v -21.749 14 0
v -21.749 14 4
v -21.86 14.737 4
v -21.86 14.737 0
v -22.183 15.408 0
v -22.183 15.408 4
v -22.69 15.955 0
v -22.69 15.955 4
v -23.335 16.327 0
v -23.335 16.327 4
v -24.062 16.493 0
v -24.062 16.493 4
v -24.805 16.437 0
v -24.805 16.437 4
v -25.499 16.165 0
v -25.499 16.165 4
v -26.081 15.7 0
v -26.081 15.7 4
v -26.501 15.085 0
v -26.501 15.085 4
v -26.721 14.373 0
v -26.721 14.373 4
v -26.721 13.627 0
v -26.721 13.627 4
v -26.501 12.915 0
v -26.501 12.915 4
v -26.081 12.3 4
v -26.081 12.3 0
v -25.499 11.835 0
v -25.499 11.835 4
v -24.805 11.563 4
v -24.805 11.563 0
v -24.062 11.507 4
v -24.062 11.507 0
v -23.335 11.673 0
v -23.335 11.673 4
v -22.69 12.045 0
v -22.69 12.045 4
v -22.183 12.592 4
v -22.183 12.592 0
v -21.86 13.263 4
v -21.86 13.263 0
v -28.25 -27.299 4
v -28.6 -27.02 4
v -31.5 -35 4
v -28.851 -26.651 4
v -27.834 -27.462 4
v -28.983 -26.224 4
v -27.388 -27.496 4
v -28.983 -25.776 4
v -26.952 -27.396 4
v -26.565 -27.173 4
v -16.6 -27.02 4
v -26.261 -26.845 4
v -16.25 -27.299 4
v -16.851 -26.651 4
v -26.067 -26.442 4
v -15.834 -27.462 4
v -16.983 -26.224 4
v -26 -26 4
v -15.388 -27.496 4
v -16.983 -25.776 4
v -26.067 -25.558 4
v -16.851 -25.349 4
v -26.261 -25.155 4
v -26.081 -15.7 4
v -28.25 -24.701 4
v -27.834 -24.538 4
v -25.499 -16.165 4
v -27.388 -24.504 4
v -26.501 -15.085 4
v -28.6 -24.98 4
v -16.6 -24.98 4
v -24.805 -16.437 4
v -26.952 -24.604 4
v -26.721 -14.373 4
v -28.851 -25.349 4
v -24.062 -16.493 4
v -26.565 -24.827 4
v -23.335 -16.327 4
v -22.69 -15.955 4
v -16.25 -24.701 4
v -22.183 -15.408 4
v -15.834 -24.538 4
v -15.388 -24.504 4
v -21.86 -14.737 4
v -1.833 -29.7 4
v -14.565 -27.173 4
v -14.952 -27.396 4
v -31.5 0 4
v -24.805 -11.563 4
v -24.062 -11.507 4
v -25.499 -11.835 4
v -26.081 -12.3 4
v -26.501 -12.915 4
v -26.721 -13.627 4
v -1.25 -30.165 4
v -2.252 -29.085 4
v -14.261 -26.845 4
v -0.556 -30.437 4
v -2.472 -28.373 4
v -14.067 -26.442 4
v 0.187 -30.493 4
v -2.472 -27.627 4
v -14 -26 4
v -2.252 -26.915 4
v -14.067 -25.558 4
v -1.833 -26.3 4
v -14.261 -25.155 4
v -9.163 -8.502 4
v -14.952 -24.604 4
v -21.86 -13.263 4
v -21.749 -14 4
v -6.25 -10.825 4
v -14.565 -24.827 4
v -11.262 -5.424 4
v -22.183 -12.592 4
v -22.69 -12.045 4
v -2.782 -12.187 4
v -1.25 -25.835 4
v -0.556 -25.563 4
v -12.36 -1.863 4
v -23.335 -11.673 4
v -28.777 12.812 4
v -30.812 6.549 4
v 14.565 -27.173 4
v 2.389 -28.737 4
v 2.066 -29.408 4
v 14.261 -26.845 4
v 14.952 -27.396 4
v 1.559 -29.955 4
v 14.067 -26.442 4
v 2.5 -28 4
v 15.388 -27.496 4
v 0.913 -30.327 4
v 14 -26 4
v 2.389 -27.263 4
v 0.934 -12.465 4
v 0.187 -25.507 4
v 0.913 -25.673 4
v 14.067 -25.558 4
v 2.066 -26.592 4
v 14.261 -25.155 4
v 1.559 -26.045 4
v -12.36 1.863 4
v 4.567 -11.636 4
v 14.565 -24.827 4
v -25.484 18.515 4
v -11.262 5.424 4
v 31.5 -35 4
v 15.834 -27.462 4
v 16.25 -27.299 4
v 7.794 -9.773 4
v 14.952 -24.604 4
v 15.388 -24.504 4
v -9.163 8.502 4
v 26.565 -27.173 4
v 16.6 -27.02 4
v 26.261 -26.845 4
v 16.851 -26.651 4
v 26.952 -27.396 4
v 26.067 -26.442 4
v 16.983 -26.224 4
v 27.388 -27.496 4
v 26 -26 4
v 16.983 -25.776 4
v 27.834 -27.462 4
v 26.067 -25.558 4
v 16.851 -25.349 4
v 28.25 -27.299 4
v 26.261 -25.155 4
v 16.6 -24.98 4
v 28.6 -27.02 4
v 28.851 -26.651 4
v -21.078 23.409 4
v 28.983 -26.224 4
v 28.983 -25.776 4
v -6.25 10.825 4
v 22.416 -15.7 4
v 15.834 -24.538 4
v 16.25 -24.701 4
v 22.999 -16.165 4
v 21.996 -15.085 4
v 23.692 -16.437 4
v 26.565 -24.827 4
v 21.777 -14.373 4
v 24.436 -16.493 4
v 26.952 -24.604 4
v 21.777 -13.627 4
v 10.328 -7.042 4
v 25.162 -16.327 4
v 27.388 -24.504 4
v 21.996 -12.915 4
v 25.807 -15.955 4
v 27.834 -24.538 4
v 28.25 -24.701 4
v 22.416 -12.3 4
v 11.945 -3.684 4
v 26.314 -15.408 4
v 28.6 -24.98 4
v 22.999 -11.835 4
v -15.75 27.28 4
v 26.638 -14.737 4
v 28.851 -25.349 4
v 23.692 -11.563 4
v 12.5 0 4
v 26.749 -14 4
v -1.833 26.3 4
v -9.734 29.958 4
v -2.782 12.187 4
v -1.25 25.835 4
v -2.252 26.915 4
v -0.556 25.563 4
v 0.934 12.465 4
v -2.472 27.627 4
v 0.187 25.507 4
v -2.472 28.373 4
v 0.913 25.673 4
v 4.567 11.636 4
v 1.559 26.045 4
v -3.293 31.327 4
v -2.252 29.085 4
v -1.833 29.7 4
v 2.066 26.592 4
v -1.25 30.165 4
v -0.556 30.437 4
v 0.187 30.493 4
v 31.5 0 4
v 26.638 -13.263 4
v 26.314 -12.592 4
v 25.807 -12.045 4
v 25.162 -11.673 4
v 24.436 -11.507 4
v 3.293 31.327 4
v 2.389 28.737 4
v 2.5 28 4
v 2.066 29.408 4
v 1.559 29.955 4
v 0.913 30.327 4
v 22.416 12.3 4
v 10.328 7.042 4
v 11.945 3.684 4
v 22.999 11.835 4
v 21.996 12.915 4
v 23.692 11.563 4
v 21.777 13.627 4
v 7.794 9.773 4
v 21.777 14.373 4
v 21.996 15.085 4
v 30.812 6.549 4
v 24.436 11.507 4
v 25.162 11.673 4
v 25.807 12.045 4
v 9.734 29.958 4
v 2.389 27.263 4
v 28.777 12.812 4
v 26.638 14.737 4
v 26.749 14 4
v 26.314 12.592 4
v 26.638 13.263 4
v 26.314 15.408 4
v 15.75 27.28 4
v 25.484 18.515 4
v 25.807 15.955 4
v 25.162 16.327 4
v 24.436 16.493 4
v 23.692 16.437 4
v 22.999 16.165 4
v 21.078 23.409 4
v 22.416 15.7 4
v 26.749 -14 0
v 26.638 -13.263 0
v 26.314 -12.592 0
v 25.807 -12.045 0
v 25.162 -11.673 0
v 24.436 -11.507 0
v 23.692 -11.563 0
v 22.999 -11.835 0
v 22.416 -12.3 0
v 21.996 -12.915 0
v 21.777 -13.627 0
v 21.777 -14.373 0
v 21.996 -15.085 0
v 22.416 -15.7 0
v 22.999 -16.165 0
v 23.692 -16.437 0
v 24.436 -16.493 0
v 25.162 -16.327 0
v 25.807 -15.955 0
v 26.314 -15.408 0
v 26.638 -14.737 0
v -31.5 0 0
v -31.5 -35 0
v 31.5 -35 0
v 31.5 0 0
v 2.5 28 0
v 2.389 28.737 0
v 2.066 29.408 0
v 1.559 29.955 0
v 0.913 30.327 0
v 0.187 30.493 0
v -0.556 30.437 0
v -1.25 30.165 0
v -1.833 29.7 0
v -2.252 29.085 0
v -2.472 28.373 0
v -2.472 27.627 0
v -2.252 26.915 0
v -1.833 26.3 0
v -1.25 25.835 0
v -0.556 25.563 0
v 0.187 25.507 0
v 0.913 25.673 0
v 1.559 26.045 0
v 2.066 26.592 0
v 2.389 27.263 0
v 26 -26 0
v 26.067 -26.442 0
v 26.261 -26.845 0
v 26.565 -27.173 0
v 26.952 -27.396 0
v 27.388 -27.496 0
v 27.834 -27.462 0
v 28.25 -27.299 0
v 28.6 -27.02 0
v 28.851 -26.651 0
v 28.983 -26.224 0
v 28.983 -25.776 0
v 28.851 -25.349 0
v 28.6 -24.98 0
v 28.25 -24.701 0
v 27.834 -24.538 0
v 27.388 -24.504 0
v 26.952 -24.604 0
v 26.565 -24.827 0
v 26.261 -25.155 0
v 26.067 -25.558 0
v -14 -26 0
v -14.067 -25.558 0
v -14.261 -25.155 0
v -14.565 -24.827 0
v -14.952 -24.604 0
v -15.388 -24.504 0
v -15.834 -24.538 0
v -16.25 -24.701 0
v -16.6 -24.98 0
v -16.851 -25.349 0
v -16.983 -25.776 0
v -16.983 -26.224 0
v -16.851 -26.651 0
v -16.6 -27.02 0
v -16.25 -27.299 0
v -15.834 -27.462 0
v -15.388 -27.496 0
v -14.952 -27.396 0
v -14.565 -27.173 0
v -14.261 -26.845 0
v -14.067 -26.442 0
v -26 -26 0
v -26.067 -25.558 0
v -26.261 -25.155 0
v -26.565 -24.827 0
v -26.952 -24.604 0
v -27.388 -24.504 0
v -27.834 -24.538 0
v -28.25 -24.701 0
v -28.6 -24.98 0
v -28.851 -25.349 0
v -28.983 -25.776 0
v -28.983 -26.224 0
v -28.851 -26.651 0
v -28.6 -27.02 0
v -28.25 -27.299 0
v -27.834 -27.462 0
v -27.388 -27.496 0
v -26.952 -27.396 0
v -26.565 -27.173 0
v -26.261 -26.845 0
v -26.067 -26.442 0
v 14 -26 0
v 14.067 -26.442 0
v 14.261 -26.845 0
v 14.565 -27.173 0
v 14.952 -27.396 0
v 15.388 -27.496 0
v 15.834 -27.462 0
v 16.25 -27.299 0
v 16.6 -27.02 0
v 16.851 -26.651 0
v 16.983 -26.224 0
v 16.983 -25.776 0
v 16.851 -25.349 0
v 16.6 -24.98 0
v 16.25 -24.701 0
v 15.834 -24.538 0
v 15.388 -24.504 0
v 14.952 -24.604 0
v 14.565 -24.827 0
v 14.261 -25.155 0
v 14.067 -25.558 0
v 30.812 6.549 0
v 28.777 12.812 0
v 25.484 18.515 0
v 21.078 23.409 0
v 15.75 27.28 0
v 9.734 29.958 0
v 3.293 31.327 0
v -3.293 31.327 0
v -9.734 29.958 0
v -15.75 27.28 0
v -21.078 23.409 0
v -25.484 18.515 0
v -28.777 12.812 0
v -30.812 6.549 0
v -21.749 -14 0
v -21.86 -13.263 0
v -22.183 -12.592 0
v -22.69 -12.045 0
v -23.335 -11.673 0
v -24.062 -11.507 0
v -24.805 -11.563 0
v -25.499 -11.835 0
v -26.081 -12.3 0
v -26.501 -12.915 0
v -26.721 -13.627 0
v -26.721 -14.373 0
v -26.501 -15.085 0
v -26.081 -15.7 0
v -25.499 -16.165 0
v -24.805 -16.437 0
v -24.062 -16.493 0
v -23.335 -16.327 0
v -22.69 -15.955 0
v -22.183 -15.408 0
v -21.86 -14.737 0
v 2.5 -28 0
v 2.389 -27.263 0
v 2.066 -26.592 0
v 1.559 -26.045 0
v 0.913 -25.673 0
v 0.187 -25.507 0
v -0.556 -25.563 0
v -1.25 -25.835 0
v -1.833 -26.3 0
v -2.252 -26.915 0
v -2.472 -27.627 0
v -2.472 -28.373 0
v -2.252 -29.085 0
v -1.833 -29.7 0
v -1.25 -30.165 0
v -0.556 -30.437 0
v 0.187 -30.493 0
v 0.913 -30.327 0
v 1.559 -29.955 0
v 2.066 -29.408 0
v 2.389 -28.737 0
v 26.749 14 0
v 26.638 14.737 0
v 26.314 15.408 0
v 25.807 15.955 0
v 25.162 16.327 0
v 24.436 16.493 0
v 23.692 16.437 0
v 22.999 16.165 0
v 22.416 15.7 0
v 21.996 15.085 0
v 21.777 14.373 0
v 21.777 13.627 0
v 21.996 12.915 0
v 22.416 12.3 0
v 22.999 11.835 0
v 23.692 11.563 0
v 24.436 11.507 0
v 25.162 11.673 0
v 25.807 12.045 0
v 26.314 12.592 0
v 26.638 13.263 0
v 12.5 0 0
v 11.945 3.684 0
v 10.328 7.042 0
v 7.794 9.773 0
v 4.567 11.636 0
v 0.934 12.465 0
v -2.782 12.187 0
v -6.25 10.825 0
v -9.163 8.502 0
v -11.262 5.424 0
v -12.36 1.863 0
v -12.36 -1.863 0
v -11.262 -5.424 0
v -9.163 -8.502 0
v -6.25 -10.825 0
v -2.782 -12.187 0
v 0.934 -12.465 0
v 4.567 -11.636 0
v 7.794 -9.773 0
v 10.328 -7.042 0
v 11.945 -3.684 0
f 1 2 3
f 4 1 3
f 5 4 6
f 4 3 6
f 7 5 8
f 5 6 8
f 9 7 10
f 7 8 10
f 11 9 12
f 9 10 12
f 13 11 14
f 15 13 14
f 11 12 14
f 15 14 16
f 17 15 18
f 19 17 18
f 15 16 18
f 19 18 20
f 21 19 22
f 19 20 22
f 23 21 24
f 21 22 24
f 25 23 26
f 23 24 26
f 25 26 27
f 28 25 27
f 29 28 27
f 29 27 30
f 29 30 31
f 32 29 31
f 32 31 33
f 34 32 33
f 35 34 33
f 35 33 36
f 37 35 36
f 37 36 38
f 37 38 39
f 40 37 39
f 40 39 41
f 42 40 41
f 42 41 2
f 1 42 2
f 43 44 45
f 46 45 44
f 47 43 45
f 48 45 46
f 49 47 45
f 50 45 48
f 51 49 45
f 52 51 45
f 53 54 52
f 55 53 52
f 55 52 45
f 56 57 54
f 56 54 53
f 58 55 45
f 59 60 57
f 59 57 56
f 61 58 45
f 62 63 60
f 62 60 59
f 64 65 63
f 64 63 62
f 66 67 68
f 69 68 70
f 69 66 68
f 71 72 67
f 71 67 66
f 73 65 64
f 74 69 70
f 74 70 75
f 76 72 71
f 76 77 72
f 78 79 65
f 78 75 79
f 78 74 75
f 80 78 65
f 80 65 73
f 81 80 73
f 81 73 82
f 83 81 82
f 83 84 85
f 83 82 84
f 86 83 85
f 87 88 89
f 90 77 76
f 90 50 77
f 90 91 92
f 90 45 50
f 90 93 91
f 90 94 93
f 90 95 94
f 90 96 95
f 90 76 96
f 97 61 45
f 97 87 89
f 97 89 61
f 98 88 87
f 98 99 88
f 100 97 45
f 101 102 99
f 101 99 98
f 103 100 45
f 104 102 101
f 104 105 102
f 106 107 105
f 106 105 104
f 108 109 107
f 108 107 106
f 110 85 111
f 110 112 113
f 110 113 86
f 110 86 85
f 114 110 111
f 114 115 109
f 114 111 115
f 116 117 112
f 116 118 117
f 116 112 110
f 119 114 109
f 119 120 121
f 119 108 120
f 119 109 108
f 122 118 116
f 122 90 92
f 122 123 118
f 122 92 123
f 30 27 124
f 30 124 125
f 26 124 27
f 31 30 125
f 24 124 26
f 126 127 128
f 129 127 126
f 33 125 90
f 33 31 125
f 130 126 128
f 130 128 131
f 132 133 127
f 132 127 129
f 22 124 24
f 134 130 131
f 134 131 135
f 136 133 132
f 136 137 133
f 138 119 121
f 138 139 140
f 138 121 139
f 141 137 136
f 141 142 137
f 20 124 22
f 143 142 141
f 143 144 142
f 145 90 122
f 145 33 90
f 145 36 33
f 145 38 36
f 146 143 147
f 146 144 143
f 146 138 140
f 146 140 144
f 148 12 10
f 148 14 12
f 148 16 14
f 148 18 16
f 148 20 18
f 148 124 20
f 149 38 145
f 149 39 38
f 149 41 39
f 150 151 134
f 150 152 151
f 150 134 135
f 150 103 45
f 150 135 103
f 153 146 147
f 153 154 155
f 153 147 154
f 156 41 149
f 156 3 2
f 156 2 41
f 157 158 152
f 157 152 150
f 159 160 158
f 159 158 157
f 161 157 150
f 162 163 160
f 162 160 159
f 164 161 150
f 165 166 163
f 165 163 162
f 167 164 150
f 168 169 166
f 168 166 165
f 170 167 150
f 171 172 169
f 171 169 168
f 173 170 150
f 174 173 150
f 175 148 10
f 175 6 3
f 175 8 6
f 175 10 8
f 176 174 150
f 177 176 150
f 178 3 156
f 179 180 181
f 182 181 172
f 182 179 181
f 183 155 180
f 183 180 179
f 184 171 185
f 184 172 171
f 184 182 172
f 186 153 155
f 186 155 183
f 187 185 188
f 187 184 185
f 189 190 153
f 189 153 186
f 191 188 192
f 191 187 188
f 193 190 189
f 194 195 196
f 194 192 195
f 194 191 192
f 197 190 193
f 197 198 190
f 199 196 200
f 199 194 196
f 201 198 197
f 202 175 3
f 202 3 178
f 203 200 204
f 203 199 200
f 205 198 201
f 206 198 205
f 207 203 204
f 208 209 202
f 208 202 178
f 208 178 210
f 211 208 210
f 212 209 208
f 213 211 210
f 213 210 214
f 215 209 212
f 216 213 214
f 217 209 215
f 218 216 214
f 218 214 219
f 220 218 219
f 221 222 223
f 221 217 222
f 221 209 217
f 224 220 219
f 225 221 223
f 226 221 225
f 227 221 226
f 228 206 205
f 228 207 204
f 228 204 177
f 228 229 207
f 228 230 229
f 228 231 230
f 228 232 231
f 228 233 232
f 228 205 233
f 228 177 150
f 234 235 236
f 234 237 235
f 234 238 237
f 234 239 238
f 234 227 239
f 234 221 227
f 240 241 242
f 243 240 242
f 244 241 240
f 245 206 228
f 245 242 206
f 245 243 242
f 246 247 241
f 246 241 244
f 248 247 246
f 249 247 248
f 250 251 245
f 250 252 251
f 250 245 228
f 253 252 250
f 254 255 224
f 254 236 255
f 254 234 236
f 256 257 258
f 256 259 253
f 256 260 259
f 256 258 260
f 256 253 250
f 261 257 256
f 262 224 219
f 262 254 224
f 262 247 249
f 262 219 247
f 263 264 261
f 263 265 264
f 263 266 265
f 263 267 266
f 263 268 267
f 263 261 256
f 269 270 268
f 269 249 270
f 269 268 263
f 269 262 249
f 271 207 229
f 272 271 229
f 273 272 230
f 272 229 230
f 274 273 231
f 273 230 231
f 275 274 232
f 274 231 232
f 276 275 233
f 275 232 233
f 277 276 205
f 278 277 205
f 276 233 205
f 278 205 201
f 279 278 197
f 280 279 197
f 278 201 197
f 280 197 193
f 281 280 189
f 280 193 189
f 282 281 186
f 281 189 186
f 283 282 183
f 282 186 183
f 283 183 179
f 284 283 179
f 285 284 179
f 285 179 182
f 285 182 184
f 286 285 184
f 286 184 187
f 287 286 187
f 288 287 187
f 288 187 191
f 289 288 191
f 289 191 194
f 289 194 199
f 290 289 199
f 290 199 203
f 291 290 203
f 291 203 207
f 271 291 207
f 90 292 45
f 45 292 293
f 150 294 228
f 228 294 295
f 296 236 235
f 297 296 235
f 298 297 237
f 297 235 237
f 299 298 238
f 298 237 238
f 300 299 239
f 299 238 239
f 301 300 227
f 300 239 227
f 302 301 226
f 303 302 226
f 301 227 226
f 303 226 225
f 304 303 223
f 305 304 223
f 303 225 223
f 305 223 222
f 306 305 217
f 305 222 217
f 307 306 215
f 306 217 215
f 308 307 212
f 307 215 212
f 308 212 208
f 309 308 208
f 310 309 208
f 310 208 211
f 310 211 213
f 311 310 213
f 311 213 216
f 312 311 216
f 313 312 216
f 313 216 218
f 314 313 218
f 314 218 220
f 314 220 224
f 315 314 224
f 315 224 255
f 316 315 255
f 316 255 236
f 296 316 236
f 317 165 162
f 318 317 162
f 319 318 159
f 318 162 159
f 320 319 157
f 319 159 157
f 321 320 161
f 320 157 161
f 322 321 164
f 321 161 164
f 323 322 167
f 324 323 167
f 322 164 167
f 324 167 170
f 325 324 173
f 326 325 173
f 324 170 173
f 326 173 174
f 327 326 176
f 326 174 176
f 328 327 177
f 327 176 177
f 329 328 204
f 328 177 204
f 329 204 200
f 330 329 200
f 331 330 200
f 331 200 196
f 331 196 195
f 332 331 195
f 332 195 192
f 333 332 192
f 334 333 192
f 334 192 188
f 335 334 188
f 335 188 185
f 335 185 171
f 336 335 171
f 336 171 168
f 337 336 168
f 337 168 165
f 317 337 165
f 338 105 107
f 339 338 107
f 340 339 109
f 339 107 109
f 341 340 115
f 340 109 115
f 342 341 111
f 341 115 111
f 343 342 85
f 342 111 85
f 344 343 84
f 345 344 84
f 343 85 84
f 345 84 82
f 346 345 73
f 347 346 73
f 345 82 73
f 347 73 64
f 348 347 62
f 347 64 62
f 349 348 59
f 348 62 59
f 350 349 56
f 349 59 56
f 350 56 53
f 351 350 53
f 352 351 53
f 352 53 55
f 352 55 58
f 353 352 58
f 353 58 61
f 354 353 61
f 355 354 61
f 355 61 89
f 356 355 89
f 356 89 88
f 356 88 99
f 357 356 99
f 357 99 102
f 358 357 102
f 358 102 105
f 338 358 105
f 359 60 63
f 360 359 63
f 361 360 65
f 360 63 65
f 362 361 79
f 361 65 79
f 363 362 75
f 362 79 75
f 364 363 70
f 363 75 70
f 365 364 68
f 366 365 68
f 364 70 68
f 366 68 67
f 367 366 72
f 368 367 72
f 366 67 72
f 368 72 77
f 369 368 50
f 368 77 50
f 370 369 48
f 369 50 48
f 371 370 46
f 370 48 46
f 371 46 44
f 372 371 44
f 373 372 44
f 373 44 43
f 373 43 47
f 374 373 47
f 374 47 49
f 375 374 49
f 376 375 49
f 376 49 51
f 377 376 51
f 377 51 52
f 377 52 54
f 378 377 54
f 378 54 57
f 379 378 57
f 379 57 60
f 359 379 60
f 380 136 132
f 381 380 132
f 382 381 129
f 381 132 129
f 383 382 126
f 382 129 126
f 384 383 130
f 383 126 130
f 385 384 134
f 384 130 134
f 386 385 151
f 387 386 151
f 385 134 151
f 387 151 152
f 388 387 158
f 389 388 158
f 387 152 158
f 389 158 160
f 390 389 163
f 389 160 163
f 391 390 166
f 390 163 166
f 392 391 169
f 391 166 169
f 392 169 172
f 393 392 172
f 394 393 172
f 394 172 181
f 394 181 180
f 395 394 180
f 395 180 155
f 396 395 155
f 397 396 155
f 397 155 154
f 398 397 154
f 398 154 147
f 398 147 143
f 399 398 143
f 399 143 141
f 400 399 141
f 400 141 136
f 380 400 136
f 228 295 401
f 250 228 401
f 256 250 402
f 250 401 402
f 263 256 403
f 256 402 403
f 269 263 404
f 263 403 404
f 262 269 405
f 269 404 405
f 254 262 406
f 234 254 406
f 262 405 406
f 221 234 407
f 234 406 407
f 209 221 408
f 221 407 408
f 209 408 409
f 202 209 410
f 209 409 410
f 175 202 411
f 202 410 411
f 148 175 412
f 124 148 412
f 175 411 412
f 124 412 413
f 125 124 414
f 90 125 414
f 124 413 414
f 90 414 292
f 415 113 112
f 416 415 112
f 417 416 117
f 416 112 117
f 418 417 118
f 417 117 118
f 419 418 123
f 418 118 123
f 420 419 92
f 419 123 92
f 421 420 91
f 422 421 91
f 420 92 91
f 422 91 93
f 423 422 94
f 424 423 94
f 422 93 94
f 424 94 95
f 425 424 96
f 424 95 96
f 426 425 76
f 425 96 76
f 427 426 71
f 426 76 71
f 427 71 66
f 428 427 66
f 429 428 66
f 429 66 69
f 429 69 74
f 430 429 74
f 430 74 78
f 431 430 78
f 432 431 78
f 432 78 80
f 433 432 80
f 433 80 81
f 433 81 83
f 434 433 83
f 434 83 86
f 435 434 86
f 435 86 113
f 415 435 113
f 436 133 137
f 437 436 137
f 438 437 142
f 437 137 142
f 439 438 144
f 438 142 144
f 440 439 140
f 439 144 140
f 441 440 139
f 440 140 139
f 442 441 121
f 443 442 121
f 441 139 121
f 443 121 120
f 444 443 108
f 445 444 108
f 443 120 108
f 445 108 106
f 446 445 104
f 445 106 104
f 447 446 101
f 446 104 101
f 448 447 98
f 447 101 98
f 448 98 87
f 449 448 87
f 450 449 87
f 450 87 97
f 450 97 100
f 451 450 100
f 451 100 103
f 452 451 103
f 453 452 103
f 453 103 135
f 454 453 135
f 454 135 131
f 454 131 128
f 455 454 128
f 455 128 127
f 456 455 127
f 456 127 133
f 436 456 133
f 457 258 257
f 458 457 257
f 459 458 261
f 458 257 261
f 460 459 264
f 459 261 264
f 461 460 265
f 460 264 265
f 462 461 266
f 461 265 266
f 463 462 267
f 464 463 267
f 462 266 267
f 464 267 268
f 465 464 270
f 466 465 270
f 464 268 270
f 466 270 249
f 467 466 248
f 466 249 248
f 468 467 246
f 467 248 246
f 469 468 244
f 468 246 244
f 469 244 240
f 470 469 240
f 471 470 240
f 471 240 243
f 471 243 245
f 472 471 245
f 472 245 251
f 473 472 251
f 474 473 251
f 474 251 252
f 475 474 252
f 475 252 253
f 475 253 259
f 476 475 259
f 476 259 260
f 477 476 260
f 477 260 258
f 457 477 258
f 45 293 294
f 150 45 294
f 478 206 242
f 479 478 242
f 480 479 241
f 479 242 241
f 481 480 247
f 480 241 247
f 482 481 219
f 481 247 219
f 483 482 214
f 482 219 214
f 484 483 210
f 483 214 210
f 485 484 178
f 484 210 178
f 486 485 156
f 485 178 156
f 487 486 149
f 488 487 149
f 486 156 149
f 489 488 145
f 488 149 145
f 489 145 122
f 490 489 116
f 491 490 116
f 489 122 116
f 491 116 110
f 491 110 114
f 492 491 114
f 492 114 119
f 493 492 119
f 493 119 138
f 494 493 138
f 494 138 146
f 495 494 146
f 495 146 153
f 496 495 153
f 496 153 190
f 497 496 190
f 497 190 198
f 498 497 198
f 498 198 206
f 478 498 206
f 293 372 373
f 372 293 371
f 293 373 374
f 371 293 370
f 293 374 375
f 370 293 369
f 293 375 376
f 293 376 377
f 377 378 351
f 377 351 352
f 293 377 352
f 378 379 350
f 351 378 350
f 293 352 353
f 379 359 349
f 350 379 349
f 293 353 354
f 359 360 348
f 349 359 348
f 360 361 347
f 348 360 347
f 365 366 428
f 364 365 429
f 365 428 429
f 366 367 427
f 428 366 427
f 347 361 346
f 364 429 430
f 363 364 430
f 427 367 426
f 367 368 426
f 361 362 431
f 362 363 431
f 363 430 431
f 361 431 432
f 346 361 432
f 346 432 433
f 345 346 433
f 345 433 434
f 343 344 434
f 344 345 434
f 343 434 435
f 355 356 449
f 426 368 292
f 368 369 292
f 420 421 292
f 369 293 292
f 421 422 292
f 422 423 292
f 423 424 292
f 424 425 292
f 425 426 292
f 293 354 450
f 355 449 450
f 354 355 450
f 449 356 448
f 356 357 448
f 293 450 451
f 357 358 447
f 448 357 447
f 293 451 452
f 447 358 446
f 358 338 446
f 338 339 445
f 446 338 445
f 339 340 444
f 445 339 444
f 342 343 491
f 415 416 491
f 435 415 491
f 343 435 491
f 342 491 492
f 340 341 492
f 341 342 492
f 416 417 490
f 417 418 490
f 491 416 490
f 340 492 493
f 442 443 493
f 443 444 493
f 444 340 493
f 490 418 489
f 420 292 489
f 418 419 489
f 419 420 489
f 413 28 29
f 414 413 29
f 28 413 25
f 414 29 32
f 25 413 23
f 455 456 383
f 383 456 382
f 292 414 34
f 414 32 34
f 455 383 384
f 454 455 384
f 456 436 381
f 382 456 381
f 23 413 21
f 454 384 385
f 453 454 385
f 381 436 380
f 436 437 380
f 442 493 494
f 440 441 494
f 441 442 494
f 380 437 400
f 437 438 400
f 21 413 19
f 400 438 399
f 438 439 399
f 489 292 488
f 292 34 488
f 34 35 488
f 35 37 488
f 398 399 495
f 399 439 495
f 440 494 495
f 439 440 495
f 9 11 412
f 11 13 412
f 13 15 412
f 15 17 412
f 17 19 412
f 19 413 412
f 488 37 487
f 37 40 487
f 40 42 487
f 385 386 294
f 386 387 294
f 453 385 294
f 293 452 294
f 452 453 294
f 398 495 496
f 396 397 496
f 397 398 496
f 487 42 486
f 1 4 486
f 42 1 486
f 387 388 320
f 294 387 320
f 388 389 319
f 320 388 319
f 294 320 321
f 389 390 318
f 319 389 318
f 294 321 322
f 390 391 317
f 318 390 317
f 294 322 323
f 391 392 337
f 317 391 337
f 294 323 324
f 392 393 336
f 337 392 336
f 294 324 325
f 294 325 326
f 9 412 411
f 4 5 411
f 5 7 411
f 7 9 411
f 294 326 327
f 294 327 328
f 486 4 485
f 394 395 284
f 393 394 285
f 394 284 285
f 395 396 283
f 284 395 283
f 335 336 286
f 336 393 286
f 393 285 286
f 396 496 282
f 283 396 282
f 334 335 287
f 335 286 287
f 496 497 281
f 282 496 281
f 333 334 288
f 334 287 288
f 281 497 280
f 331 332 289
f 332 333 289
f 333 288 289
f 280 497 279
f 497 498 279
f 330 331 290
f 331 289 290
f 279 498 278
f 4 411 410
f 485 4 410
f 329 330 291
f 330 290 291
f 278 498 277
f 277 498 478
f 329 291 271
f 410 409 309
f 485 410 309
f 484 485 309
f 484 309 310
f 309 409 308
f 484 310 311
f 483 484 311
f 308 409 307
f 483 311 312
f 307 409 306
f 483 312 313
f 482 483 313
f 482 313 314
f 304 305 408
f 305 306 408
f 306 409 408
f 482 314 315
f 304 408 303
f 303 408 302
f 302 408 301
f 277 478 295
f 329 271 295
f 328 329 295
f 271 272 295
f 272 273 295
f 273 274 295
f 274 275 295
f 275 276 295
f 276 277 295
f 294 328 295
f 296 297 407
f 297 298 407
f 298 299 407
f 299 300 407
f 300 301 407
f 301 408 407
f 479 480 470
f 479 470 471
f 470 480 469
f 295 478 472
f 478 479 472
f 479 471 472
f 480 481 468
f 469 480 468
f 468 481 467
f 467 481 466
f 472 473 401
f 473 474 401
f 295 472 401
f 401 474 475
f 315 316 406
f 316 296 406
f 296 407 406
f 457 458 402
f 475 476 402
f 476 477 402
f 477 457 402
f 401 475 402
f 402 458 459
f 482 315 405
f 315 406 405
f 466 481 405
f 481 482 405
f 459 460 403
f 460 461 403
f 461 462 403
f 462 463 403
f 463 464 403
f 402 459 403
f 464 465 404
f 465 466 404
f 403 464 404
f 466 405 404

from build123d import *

# Parameters (mm, degrees)
SKETCH_1_R          = 31.5
EXTRUDE_1_DEPTH     = 4
SKETCH_2_R          = 12.5
SKETCH_2_R_2        = 2.5
CUT_EXTRUDE_1_DEPTH = 48.257274572
SKETCH_3_R          = 1.5
CUT_EXTRUDE_2_DEPTH = 48.257274572


with BuildPart() as part:
    # 草图1 → 凸台-拉伸1 (new body)
    with BuildSketch(Plane.XY):
        Circle(SKETCH_1_R)
        with BuildLine():
            ThreePointArc((31.5, 0), (0, -31.5), (-31.5, 0))
            Line((-31.5, 0), (-31.5, -35))
            Line((-31.5, -35), (31.5, -35))
            Line((31.5, -35), (31.5, 0))
        make_face()
    extrude(amount=EXTRUDE_1_DEPTH)

    # 草图2 → 切除-拉伸1 (cut, through all)
    with BuildSketch(Plane.XY.offset(4)):
        Circle(SKETCH_2_R)
        with Locations((0, 28)):
            Circle(SKETCH_2_R_2)
        with Locations((24.248711306, -14)):
            Circle(SKETCH_2_R_2)
        with Locations((-24.248711306, -14)):
            Circle(SKETCH_2_R_2)
        with Locations((0, -28)):
            Circle(SKETCH_2_R_2)
        with Locations((-24.248711306, 14)):
            Circle(SKETCH_2_R_2)
        with Locations((24.248711306, 14)):
            Circle(SKETCH_2_R_2)
    extrude(amount=-CUT_EXTRUDE_1_DEPTH, mode=Mode.SUBTRACT)

    # 草图3 → 切除-拉伸2 (cut, through all)
    with BuildSketch(Plane.XY.offset(4)):
        with Locations((-27.5, -26)):
            Circle(SKETCH_3_R)
        with Locations((-15.5, -26)):
            Circle(SKETCH_3_R)
        with Locations(Location((15.5, -26, 0), (0, 0, 180))):
            Circle(SKETCH_3_R)
        with Locations(Location((27.5, -26, 0), (0, 0, 180))):
            Circle(SKETCH_3_R)
    extrude(amount=-CUT_EXTRUDE_2_DEPTH, mode=Mode.SUBTRACT)


solid = part.part
